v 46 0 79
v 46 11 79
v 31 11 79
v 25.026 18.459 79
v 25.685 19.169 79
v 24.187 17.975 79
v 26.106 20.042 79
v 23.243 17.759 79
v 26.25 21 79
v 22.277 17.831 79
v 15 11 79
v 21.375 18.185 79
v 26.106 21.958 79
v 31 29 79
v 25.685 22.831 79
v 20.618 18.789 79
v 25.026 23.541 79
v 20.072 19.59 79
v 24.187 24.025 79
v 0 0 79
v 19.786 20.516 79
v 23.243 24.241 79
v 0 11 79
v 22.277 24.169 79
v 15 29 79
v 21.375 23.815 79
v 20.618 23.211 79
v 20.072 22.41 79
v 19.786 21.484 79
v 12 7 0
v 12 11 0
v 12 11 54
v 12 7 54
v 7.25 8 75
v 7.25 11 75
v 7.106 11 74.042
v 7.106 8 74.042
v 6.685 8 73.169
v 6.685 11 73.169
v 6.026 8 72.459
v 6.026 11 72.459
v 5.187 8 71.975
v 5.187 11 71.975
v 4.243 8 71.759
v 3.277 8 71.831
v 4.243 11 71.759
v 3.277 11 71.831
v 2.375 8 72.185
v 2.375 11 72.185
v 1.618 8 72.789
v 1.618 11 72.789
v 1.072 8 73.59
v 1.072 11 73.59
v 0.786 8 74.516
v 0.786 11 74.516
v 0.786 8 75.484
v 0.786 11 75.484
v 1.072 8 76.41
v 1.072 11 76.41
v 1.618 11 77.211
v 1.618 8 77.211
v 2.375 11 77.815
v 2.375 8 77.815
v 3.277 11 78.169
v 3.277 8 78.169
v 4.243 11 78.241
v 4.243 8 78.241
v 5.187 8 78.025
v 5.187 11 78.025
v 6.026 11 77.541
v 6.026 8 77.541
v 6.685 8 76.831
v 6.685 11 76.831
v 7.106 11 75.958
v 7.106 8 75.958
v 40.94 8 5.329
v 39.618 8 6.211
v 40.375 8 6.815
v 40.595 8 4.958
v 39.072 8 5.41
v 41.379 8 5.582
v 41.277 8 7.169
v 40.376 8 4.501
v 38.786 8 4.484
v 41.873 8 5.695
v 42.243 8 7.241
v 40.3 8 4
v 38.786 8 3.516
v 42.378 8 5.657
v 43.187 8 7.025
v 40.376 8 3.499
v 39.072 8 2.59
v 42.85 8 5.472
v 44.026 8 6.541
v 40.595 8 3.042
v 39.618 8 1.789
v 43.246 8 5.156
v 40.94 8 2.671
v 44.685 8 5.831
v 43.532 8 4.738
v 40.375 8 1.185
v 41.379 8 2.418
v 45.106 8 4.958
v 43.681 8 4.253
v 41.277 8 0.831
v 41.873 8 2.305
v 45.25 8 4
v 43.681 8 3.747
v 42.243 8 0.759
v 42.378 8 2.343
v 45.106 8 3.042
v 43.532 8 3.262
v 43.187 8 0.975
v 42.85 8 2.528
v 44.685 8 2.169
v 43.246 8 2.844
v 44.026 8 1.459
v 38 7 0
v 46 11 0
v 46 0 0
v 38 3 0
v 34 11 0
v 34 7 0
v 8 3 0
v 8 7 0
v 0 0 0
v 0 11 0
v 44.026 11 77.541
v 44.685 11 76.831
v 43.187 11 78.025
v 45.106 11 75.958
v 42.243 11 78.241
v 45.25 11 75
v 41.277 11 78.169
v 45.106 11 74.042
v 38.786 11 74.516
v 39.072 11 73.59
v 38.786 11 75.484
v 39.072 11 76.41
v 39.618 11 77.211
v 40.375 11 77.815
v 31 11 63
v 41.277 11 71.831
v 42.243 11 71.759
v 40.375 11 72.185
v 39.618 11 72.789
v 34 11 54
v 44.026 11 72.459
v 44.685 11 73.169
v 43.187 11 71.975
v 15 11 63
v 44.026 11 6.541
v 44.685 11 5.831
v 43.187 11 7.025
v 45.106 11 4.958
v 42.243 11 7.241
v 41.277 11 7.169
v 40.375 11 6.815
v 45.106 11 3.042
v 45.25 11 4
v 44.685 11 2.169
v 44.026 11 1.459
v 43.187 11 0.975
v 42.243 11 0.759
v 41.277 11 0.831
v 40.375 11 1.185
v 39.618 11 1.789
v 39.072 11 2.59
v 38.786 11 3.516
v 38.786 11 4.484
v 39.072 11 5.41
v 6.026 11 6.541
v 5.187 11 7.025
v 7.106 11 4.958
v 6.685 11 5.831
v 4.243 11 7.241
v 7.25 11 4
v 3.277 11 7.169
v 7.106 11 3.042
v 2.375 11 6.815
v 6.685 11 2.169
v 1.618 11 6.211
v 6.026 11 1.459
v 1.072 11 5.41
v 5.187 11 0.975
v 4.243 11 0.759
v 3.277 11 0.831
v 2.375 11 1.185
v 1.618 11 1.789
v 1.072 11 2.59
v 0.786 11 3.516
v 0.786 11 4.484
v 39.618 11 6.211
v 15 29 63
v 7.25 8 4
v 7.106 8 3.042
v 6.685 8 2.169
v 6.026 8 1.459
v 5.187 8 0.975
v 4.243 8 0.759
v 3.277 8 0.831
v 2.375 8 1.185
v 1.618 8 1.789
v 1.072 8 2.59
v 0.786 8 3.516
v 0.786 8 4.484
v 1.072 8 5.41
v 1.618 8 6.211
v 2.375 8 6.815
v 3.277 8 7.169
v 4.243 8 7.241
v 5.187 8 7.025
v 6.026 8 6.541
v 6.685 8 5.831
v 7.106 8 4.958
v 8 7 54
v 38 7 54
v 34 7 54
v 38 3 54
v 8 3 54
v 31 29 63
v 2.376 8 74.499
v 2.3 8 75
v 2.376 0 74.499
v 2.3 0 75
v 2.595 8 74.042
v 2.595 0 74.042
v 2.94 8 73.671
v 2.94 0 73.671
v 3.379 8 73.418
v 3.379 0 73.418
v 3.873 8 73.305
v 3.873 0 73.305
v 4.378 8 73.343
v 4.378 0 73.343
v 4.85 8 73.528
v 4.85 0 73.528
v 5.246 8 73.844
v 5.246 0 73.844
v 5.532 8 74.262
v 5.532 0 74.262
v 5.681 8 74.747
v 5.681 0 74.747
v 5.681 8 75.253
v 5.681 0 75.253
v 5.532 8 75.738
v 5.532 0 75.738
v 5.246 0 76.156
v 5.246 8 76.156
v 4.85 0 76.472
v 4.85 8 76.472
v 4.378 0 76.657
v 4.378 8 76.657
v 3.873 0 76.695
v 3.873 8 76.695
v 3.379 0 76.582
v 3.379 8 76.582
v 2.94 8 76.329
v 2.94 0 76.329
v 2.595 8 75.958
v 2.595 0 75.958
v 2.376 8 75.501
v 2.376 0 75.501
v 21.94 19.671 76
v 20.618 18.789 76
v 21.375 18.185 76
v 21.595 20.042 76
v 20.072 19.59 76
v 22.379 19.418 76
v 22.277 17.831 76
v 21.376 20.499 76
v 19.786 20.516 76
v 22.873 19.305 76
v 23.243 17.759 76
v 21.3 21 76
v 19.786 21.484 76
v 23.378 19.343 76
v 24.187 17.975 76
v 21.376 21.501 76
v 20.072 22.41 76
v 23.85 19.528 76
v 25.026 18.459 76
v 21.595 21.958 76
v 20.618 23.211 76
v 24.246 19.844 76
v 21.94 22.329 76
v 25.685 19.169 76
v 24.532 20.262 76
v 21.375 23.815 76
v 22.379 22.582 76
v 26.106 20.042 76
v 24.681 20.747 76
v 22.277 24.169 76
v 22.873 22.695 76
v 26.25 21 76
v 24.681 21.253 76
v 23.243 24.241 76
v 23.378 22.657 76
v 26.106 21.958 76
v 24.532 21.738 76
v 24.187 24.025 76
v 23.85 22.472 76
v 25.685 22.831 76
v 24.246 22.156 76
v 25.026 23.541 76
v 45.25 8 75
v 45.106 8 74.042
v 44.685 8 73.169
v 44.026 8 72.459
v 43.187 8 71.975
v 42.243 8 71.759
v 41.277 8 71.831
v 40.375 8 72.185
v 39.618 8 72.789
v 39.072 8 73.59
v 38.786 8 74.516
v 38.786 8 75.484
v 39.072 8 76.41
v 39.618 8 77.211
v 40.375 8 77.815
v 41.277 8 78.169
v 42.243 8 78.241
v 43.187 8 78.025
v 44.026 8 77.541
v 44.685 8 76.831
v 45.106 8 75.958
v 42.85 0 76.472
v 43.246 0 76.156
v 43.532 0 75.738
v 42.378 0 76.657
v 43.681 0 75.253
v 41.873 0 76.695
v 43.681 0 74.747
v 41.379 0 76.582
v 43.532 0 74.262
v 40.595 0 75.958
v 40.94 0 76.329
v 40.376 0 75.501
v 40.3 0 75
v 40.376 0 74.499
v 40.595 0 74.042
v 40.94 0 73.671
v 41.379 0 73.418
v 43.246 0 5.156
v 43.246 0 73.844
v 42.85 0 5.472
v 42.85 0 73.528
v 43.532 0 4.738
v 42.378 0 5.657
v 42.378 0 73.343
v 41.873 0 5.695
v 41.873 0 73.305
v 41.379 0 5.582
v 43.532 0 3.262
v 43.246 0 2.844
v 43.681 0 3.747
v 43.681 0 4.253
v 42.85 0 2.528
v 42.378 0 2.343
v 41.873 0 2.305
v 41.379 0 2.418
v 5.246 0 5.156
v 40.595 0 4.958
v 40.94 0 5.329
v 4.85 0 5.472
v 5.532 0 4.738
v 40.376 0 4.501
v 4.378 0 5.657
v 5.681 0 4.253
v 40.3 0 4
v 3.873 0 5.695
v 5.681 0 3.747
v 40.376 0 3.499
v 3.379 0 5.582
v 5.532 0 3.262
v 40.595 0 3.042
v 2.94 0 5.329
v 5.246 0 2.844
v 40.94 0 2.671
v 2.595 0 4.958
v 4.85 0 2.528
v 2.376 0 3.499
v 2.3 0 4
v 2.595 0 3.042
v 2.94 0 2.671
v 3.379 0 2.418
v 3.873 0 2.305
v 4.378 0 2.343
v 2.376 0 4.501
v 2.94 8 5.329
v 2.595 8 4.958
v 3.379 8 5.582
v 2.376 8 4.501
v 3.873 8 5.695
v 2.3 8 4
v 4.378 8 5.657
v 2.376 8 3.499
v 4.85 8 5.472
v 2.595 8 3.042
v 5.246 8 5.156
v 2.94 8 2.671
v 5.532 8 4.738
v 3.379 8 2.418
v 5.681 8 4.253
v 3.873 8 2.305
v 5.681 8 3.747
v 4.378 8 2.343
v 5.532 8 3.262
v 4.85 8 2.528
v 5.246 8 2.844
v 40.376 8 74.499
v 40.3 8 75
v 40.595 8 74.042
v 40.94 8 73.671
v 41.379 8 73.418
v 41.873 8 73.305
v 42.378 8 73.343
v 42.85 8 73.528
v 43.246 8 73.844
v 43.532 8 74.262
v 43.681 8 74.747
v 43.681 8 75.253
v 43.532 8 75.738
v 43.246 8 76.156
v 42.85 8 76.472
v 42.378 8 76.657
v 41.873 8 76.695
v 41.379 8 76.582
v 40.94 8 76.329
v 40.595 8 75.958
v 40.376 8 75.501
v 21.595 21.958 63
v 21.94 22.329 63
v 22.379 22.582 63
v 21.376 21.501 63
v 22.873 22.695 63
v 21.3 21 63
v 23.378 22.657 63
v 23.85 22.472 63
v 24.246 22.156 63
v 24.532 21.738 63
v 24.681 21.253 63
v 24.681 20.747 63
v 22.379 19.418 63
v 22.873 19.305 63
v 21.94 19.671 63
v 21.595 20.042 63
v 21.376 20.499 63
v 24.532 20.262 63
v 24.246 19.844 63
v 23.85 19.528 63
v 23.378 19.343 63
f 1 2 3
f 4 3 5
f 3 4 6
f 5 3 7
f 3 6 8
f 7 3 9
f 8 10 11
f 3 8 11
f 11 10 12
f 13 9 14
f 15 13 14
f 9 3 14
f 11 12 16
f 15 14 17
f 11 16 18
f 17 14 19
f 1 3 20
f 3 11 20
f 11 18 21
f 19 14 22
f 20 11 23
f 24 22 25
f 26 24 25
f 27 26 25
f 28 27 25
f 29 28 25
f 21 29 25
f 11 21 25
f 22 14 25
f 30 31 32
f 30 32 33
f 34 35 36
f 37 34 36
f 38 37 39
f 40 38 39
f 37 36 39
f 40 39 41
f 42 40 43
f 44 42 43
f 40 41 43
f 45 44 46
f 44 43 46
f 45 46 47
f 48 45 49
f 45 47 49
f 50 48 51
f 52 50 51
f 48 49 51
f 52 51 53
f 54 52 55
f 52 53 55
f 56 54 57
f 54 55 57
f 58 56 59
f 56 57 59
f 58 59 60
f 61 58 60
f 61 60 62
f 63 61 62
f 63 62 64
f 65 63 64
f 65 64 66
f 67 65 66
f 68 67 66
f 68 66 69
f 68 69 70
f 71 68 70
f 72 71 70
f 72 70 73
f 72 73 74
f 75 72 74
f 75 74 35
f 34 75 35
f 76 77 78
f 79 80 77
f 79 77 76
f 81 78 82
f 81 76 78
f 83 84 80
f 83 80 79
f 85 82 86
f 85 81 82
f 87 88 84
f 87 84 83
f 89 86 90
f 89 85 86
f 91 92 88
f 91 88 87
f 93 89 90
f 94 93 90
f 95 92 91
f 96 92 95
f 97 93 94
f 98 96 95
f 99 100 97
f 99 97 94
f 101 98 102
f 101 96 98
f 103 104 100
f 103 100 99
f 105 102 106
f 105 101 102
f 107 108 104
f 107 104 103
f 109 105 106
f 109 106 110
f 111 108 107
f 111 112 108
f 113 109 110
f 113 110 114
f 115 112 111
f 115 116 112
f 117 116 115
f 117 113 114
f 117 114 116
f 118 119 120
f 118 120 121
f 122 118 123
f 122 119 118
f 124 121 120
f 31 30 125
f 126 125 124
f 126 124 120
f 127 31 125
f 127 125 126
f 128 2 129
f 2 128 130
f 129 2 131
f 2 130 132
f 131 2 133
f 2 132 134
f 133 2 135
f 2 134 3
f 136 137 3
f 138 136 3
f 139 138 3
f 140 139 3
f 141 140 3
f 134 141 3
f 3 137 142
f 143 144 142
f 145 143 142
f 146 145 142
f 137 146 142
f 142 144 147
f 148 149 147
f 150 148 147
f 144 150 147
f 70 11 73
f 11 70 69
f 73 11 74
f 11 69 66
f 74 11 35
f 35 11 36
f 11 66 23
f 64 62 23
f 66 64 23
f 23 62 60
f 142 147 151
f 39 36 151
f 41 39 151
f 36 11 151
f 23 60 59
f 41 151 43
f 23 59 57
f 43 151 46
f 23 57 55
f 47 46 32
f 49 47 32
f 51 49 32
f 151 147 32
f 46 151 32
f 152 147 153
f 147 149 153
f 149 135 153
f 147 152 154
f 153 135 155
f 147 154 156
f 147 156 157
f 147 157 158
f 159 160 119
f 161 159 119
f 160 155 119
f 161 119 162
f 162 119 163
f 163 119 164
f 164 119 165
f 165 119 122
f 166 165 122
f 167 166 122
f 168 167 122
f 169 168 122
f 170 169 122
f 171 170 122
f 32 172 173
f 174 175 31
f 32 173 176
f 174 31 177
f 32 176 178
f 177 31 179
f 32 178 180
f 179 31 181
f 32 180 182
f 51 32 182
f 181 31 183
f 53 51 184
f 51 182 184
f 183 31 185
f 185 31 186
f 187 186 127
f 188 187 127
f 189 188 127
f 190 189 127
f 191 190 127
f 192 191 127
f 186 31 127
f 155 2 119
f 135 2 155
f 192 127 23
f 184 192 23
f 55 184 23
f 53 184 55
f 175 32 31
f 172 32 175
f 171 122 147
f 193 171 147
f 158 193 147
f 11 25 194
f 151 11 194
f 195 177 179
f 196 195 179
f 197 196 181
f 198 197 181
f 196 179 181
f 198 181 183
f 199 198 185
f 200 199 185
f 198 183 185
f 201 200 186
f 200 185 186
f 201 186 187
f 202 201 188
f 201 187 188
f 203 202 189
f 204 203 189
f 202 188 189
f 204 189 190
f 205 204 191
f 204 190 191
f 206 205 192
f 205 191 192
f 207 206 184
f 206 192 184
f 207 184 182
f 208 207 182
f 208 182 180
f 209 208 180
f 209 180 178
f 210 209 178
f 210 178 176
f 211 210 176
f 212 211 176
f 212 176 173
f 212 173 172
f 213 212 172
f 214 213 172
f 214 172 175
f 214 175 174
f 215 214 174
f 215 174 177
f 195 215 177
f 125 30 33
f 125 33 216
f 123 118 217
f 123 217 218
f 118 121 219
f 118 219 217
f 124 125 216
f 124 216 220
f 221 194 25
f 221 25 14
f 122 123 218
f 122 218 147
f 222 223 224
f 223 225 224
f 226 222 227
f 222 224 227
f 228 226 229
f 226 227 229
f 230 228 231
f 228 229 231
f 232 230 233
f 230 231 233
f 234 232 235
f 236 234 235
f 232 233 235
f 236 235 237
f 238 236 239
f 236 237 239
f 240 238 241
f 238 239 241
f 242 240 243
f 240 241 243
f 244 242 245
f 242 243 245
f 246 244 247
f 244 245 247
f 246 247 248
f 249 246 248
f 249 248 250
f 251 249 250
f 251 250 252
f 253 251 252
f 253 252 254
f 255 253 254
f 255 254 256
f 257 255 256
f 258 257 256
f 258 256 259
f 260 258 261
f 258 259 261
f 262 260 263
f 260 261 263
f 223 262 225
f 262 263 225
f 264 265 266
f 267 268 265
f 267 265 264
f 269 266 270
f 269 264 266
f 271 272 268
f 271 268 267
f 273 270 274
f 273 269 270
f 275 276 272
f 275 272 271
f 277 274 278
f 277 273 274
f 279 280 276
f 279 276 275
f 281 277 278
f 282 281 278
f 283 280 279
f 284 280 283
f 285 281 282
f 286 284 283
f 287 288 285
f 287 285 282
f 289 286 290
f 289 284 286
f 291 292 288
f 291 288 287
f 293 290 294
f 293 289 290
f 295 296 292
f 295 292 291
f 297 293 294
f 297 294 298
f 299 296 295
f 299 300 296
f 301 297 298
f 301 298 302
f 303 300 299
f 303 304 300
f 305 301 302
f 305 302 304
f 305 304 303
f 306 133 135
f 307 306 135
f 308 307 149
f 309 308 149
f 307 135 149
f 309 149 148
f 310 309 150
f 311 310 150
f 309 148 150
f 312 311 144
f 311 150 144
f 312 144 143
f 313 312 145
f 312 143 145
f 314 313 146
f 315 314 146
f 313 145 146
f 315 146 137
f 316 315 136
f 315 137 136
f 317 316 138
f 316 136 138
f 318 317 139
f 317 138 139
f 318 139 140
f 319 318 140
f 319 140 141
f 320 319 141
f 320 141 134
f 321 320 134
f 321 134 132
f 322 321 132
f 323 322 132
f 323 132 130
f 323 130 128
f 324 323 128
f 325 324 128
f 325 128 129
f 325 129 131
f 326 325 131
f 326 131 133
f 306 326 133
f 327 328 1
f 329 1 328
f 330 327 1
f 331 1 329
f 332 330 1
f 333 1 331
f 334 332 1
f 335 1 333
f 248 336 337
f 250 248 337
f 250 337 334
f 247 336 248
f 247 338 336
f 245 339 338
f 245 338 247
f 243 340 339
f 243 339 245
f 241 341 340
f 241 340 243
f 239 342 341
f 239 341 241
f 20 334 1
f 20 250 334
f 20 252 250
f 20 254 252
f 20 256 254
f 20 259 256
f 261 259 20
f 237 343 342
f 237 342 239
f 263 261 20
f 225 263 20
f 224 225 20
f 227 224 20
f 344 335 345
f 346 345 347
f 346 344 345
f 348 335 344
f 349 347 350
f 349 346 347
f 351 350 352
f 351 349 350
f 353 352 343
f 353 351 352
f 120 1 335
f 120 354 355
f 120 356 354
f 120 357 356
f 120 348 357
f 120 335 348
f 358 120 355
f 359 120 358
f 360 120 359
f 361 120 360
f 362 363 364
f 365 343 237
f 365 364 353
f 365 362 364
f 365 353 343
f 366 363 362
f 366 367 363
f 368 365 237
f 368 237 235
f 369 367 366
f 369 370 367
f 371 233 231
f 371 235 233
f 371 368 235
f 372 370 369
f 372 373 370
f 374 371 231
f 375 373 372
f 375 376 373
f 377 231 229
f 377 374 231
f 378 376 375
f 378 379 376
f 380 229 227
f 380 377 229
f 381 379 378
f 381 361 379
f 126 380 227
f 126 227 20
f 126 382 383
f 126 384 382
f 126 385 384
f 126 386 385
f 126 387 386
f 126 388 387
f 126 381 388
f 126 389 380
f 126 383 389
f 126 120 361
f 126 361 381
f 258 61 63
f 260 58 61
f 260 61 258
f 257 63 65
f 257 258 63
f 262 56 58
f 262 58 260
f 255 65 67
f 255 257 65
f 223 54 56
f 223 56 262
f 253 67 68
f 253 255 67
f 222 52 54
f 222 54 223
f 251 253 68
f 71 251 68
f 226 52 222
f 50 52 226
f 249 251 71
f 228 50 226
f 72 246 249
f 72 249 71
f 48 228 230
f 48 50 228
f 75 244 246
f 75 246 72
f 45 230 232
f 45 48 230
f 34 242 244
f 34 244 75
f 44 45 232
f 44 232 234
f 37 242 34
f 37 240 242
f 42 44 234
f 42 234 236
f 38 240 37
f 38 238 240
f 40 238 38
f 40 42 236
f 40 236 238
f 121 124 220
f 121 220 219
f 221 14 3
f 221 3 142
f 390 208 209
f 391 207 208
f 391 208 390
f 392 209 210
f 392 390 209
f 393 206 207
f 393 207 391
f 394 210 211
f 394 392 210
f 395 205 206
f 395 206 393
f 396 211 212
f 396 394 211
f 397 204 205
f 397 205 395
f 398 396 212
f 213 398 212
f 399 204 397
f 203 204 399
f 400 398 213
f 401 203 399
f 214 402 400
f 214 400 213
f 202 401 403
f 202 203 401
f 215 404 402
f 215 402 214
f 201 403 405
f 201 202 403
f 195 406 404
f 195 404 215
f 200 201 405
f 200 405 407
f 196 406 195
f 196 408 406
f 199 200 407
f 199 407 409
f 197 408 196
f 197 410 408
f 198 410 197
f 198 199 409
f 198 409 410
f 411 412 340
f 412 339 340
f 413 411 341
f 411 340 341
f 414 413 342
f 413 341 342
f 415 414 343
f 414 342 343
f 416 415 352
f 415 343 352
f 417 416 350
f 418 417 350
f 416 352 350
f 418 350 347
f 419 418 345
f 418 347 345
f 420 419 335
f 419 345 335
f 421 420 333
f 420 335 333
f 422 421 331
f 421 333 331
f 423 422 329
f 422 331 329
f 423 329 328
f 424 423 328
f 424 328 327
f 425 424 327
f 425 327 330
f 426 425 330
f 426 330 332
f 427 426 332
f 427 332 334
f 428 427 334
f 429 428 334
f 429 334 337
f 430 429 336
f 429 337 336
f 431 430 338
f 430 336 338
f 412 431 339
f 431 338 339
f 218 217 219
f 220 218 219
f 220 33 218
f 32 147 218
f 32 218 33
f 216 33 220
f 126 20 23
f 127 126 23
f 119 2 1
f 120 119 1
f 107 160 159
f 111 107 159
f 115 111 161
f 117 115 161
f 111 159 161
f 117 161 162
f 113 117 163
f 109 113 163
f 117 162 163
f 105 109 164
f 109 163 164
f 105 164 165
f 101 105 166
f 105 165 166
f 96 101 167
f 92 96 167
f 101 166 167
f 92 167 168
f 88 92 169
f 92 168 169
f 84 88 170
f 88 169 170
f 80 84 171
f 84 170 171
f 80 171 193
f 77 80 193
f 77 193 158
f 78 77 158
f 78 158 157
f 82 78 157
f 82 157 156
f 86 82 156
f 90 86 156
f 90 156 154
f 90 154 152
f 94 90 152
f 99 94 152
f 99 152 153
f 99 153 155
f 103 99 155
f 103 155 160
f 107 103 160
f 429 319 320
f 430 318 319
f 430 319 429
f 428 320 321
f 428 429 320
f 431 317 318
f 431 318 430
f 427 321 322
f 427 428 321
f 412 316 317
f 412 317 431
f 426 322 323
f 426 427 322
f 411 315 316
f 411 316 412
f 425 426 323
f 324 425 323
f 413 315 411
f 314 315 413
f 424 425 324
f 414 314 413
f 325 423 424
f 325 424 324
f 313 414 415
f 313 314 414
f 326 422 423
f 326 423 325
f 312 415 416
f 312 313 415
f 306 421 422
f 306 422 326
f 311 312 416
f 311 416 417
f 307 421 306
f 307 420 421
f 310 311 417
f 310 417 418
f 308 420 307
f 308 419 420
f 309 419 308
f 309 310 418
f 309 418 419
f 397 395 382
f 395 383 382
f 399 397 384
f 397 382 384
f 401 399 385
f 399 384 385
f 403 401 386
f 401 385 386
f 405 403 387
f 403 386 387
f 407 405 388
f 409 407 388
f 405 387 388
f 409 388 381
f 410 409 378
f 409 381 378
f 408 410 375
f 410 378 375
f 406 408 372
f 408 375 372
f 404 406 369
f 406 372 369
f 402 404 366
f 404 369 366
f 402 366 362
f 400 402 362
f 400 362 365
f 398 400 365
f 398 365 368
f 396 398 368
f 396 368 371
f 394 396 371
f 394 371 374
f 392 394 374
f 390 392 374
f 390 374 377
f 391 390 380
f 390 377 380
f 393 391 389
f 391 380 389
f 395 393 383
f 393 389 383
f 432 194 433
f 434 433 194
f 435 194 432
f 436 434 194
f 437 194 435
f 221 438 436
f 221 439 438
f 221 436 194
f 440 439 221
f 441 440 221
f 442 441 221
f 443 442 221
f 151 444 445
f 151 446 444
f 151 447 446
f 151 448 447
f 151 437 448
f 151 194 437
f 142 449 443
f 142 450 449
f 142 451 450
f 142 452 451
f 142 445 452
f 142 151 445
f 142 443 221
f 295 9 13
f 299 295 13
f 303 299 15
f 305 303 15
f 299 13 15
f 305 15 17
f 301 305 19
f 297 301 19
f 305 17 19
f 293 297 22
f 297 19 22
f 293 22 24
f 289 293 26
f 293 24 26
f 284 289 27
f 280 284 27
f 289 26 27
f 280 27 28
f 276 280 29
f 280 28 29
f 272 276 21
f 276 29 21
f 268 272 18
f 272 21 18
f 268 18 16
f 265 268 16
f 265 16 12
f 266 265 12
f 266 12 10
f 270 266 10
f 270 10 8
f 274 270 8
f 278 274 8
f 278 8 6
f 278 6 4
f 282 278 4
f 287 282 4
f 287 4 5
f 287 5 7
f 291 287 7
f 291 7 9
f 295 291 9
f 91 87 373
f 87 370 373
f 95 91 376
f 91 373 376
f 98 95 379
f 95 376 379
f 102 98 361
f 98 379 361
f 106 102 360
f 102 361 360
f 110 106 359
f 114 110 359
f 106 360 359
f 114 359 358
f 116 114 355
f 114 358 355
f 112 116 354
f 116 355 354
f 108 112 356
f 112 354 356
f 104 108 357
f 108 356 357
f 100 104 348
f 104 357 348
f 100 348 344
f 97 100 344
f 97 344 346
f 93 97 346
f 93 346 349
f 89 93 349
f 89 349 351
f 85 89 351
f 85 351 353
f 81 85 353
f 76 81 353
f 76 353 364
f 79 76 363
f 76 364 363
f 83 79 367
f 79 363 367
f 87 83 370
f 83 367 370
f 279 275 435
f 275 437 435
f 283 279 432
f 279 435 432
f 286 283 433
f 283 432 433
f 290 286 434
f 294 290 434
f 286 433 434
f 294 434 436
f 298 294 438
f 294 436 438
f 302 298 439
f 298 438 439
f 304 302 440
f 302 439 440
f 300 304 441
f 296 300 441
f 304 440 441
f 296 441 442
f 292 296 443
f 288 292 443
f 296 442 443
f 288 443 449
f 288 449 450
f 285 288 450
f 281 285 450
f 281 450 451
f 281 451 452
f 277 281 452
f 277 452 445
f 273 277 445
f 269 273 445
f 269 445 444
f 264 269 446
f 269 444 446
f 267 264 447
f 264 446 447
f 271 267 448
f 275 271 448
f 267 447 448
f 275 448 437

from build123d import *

# Parameters (mm, degrees)
EXTRUDE_1_DEPTH             = 54
EXTRUDE_2_DEPTH             = 25
HOLE_WIZARD_M31_D           = 3.4
HOLE_WIZARD_M31_CBORE_D     = 6.5
HOLE_WIZARD_M31_CBORE_DEPTH = 3
SKETCH_6_W                  = 16
SKETCH_6_H                  = 16
EXTRUDE_3_DEPTH             = 18
HOLE_WIZARD_M32_D           = 3.4
HOLE_WIZARD_M32_CBORE_D     = 6.5
HOLE_WIZARD_M32_CBORE_DEPTH = 3


with BuildPart() as part:
    # Эскиз1 → Бобышка-Вытянуть1 (new body)
    with BuildSketch(Plane.XY):
        Polygon((0, 0), (0, 11), (12, 11), (12, 7), (8, 7), (8, 3), (38, 3), (38, 7), (34, 7), (34, 11), (46, 11), (46, 0), align=None)
    extrude(amount=EXTRUDE_1_DEPTH)

    # Эскиз2 → Бобышка-Вытянуть2 (add)
    with BuildSketch(Plane.XY.offset(54)):
        Polygon((0, 11), (12, 11), (34, 11), (46, 11), (46, 0), (0, 0), align=None)
    extrude(amount=EXTRUDE_2_DEPTH)

    # Цековка для винта с внутренним шестигранником M31 (through all)
    with Locations(Plane(origin=(0, 11, 0), x_dir=(1, 0, 0), z_dir=(0, 1, 0))):
        with Locations((42, -4), (42, -75), (4, -4), (4, -75)):
            CounterBoreHole(HOLE_WIZARD_M31_D / 2, HOLE_WIZARD_M31_CBORE_D / 2, HOLE_WIZARD_M31_CBORE_DEPTH)

    # Эскиз6 → Бобышка-Вытянуть3 (add)
    with BuildSketch(Plane(origin=(0, 11, 0), x_dir=(1, 0, 0), z_dir=(0, 1, 0))):
        with Locations((23, -71)):
            Rectangle(SKETCH_6_W, SKETCH_6_H)
    extrude(amount=EXTRUDE_3_DEPTH)

    # Цековка для винта с внутренним шестигранником M32 (through all)
    with Locations(Plane.XY.offset(79)):
        with Locations((23, 21)):
            CounterBoreHole(HOLE_WIZARD_M32_D / 2, HOLE_WIZARD_M32_CBORE_D / 2, HOLE_WIZARD_M32_CBORE_DEPTH)


solid = part.part
